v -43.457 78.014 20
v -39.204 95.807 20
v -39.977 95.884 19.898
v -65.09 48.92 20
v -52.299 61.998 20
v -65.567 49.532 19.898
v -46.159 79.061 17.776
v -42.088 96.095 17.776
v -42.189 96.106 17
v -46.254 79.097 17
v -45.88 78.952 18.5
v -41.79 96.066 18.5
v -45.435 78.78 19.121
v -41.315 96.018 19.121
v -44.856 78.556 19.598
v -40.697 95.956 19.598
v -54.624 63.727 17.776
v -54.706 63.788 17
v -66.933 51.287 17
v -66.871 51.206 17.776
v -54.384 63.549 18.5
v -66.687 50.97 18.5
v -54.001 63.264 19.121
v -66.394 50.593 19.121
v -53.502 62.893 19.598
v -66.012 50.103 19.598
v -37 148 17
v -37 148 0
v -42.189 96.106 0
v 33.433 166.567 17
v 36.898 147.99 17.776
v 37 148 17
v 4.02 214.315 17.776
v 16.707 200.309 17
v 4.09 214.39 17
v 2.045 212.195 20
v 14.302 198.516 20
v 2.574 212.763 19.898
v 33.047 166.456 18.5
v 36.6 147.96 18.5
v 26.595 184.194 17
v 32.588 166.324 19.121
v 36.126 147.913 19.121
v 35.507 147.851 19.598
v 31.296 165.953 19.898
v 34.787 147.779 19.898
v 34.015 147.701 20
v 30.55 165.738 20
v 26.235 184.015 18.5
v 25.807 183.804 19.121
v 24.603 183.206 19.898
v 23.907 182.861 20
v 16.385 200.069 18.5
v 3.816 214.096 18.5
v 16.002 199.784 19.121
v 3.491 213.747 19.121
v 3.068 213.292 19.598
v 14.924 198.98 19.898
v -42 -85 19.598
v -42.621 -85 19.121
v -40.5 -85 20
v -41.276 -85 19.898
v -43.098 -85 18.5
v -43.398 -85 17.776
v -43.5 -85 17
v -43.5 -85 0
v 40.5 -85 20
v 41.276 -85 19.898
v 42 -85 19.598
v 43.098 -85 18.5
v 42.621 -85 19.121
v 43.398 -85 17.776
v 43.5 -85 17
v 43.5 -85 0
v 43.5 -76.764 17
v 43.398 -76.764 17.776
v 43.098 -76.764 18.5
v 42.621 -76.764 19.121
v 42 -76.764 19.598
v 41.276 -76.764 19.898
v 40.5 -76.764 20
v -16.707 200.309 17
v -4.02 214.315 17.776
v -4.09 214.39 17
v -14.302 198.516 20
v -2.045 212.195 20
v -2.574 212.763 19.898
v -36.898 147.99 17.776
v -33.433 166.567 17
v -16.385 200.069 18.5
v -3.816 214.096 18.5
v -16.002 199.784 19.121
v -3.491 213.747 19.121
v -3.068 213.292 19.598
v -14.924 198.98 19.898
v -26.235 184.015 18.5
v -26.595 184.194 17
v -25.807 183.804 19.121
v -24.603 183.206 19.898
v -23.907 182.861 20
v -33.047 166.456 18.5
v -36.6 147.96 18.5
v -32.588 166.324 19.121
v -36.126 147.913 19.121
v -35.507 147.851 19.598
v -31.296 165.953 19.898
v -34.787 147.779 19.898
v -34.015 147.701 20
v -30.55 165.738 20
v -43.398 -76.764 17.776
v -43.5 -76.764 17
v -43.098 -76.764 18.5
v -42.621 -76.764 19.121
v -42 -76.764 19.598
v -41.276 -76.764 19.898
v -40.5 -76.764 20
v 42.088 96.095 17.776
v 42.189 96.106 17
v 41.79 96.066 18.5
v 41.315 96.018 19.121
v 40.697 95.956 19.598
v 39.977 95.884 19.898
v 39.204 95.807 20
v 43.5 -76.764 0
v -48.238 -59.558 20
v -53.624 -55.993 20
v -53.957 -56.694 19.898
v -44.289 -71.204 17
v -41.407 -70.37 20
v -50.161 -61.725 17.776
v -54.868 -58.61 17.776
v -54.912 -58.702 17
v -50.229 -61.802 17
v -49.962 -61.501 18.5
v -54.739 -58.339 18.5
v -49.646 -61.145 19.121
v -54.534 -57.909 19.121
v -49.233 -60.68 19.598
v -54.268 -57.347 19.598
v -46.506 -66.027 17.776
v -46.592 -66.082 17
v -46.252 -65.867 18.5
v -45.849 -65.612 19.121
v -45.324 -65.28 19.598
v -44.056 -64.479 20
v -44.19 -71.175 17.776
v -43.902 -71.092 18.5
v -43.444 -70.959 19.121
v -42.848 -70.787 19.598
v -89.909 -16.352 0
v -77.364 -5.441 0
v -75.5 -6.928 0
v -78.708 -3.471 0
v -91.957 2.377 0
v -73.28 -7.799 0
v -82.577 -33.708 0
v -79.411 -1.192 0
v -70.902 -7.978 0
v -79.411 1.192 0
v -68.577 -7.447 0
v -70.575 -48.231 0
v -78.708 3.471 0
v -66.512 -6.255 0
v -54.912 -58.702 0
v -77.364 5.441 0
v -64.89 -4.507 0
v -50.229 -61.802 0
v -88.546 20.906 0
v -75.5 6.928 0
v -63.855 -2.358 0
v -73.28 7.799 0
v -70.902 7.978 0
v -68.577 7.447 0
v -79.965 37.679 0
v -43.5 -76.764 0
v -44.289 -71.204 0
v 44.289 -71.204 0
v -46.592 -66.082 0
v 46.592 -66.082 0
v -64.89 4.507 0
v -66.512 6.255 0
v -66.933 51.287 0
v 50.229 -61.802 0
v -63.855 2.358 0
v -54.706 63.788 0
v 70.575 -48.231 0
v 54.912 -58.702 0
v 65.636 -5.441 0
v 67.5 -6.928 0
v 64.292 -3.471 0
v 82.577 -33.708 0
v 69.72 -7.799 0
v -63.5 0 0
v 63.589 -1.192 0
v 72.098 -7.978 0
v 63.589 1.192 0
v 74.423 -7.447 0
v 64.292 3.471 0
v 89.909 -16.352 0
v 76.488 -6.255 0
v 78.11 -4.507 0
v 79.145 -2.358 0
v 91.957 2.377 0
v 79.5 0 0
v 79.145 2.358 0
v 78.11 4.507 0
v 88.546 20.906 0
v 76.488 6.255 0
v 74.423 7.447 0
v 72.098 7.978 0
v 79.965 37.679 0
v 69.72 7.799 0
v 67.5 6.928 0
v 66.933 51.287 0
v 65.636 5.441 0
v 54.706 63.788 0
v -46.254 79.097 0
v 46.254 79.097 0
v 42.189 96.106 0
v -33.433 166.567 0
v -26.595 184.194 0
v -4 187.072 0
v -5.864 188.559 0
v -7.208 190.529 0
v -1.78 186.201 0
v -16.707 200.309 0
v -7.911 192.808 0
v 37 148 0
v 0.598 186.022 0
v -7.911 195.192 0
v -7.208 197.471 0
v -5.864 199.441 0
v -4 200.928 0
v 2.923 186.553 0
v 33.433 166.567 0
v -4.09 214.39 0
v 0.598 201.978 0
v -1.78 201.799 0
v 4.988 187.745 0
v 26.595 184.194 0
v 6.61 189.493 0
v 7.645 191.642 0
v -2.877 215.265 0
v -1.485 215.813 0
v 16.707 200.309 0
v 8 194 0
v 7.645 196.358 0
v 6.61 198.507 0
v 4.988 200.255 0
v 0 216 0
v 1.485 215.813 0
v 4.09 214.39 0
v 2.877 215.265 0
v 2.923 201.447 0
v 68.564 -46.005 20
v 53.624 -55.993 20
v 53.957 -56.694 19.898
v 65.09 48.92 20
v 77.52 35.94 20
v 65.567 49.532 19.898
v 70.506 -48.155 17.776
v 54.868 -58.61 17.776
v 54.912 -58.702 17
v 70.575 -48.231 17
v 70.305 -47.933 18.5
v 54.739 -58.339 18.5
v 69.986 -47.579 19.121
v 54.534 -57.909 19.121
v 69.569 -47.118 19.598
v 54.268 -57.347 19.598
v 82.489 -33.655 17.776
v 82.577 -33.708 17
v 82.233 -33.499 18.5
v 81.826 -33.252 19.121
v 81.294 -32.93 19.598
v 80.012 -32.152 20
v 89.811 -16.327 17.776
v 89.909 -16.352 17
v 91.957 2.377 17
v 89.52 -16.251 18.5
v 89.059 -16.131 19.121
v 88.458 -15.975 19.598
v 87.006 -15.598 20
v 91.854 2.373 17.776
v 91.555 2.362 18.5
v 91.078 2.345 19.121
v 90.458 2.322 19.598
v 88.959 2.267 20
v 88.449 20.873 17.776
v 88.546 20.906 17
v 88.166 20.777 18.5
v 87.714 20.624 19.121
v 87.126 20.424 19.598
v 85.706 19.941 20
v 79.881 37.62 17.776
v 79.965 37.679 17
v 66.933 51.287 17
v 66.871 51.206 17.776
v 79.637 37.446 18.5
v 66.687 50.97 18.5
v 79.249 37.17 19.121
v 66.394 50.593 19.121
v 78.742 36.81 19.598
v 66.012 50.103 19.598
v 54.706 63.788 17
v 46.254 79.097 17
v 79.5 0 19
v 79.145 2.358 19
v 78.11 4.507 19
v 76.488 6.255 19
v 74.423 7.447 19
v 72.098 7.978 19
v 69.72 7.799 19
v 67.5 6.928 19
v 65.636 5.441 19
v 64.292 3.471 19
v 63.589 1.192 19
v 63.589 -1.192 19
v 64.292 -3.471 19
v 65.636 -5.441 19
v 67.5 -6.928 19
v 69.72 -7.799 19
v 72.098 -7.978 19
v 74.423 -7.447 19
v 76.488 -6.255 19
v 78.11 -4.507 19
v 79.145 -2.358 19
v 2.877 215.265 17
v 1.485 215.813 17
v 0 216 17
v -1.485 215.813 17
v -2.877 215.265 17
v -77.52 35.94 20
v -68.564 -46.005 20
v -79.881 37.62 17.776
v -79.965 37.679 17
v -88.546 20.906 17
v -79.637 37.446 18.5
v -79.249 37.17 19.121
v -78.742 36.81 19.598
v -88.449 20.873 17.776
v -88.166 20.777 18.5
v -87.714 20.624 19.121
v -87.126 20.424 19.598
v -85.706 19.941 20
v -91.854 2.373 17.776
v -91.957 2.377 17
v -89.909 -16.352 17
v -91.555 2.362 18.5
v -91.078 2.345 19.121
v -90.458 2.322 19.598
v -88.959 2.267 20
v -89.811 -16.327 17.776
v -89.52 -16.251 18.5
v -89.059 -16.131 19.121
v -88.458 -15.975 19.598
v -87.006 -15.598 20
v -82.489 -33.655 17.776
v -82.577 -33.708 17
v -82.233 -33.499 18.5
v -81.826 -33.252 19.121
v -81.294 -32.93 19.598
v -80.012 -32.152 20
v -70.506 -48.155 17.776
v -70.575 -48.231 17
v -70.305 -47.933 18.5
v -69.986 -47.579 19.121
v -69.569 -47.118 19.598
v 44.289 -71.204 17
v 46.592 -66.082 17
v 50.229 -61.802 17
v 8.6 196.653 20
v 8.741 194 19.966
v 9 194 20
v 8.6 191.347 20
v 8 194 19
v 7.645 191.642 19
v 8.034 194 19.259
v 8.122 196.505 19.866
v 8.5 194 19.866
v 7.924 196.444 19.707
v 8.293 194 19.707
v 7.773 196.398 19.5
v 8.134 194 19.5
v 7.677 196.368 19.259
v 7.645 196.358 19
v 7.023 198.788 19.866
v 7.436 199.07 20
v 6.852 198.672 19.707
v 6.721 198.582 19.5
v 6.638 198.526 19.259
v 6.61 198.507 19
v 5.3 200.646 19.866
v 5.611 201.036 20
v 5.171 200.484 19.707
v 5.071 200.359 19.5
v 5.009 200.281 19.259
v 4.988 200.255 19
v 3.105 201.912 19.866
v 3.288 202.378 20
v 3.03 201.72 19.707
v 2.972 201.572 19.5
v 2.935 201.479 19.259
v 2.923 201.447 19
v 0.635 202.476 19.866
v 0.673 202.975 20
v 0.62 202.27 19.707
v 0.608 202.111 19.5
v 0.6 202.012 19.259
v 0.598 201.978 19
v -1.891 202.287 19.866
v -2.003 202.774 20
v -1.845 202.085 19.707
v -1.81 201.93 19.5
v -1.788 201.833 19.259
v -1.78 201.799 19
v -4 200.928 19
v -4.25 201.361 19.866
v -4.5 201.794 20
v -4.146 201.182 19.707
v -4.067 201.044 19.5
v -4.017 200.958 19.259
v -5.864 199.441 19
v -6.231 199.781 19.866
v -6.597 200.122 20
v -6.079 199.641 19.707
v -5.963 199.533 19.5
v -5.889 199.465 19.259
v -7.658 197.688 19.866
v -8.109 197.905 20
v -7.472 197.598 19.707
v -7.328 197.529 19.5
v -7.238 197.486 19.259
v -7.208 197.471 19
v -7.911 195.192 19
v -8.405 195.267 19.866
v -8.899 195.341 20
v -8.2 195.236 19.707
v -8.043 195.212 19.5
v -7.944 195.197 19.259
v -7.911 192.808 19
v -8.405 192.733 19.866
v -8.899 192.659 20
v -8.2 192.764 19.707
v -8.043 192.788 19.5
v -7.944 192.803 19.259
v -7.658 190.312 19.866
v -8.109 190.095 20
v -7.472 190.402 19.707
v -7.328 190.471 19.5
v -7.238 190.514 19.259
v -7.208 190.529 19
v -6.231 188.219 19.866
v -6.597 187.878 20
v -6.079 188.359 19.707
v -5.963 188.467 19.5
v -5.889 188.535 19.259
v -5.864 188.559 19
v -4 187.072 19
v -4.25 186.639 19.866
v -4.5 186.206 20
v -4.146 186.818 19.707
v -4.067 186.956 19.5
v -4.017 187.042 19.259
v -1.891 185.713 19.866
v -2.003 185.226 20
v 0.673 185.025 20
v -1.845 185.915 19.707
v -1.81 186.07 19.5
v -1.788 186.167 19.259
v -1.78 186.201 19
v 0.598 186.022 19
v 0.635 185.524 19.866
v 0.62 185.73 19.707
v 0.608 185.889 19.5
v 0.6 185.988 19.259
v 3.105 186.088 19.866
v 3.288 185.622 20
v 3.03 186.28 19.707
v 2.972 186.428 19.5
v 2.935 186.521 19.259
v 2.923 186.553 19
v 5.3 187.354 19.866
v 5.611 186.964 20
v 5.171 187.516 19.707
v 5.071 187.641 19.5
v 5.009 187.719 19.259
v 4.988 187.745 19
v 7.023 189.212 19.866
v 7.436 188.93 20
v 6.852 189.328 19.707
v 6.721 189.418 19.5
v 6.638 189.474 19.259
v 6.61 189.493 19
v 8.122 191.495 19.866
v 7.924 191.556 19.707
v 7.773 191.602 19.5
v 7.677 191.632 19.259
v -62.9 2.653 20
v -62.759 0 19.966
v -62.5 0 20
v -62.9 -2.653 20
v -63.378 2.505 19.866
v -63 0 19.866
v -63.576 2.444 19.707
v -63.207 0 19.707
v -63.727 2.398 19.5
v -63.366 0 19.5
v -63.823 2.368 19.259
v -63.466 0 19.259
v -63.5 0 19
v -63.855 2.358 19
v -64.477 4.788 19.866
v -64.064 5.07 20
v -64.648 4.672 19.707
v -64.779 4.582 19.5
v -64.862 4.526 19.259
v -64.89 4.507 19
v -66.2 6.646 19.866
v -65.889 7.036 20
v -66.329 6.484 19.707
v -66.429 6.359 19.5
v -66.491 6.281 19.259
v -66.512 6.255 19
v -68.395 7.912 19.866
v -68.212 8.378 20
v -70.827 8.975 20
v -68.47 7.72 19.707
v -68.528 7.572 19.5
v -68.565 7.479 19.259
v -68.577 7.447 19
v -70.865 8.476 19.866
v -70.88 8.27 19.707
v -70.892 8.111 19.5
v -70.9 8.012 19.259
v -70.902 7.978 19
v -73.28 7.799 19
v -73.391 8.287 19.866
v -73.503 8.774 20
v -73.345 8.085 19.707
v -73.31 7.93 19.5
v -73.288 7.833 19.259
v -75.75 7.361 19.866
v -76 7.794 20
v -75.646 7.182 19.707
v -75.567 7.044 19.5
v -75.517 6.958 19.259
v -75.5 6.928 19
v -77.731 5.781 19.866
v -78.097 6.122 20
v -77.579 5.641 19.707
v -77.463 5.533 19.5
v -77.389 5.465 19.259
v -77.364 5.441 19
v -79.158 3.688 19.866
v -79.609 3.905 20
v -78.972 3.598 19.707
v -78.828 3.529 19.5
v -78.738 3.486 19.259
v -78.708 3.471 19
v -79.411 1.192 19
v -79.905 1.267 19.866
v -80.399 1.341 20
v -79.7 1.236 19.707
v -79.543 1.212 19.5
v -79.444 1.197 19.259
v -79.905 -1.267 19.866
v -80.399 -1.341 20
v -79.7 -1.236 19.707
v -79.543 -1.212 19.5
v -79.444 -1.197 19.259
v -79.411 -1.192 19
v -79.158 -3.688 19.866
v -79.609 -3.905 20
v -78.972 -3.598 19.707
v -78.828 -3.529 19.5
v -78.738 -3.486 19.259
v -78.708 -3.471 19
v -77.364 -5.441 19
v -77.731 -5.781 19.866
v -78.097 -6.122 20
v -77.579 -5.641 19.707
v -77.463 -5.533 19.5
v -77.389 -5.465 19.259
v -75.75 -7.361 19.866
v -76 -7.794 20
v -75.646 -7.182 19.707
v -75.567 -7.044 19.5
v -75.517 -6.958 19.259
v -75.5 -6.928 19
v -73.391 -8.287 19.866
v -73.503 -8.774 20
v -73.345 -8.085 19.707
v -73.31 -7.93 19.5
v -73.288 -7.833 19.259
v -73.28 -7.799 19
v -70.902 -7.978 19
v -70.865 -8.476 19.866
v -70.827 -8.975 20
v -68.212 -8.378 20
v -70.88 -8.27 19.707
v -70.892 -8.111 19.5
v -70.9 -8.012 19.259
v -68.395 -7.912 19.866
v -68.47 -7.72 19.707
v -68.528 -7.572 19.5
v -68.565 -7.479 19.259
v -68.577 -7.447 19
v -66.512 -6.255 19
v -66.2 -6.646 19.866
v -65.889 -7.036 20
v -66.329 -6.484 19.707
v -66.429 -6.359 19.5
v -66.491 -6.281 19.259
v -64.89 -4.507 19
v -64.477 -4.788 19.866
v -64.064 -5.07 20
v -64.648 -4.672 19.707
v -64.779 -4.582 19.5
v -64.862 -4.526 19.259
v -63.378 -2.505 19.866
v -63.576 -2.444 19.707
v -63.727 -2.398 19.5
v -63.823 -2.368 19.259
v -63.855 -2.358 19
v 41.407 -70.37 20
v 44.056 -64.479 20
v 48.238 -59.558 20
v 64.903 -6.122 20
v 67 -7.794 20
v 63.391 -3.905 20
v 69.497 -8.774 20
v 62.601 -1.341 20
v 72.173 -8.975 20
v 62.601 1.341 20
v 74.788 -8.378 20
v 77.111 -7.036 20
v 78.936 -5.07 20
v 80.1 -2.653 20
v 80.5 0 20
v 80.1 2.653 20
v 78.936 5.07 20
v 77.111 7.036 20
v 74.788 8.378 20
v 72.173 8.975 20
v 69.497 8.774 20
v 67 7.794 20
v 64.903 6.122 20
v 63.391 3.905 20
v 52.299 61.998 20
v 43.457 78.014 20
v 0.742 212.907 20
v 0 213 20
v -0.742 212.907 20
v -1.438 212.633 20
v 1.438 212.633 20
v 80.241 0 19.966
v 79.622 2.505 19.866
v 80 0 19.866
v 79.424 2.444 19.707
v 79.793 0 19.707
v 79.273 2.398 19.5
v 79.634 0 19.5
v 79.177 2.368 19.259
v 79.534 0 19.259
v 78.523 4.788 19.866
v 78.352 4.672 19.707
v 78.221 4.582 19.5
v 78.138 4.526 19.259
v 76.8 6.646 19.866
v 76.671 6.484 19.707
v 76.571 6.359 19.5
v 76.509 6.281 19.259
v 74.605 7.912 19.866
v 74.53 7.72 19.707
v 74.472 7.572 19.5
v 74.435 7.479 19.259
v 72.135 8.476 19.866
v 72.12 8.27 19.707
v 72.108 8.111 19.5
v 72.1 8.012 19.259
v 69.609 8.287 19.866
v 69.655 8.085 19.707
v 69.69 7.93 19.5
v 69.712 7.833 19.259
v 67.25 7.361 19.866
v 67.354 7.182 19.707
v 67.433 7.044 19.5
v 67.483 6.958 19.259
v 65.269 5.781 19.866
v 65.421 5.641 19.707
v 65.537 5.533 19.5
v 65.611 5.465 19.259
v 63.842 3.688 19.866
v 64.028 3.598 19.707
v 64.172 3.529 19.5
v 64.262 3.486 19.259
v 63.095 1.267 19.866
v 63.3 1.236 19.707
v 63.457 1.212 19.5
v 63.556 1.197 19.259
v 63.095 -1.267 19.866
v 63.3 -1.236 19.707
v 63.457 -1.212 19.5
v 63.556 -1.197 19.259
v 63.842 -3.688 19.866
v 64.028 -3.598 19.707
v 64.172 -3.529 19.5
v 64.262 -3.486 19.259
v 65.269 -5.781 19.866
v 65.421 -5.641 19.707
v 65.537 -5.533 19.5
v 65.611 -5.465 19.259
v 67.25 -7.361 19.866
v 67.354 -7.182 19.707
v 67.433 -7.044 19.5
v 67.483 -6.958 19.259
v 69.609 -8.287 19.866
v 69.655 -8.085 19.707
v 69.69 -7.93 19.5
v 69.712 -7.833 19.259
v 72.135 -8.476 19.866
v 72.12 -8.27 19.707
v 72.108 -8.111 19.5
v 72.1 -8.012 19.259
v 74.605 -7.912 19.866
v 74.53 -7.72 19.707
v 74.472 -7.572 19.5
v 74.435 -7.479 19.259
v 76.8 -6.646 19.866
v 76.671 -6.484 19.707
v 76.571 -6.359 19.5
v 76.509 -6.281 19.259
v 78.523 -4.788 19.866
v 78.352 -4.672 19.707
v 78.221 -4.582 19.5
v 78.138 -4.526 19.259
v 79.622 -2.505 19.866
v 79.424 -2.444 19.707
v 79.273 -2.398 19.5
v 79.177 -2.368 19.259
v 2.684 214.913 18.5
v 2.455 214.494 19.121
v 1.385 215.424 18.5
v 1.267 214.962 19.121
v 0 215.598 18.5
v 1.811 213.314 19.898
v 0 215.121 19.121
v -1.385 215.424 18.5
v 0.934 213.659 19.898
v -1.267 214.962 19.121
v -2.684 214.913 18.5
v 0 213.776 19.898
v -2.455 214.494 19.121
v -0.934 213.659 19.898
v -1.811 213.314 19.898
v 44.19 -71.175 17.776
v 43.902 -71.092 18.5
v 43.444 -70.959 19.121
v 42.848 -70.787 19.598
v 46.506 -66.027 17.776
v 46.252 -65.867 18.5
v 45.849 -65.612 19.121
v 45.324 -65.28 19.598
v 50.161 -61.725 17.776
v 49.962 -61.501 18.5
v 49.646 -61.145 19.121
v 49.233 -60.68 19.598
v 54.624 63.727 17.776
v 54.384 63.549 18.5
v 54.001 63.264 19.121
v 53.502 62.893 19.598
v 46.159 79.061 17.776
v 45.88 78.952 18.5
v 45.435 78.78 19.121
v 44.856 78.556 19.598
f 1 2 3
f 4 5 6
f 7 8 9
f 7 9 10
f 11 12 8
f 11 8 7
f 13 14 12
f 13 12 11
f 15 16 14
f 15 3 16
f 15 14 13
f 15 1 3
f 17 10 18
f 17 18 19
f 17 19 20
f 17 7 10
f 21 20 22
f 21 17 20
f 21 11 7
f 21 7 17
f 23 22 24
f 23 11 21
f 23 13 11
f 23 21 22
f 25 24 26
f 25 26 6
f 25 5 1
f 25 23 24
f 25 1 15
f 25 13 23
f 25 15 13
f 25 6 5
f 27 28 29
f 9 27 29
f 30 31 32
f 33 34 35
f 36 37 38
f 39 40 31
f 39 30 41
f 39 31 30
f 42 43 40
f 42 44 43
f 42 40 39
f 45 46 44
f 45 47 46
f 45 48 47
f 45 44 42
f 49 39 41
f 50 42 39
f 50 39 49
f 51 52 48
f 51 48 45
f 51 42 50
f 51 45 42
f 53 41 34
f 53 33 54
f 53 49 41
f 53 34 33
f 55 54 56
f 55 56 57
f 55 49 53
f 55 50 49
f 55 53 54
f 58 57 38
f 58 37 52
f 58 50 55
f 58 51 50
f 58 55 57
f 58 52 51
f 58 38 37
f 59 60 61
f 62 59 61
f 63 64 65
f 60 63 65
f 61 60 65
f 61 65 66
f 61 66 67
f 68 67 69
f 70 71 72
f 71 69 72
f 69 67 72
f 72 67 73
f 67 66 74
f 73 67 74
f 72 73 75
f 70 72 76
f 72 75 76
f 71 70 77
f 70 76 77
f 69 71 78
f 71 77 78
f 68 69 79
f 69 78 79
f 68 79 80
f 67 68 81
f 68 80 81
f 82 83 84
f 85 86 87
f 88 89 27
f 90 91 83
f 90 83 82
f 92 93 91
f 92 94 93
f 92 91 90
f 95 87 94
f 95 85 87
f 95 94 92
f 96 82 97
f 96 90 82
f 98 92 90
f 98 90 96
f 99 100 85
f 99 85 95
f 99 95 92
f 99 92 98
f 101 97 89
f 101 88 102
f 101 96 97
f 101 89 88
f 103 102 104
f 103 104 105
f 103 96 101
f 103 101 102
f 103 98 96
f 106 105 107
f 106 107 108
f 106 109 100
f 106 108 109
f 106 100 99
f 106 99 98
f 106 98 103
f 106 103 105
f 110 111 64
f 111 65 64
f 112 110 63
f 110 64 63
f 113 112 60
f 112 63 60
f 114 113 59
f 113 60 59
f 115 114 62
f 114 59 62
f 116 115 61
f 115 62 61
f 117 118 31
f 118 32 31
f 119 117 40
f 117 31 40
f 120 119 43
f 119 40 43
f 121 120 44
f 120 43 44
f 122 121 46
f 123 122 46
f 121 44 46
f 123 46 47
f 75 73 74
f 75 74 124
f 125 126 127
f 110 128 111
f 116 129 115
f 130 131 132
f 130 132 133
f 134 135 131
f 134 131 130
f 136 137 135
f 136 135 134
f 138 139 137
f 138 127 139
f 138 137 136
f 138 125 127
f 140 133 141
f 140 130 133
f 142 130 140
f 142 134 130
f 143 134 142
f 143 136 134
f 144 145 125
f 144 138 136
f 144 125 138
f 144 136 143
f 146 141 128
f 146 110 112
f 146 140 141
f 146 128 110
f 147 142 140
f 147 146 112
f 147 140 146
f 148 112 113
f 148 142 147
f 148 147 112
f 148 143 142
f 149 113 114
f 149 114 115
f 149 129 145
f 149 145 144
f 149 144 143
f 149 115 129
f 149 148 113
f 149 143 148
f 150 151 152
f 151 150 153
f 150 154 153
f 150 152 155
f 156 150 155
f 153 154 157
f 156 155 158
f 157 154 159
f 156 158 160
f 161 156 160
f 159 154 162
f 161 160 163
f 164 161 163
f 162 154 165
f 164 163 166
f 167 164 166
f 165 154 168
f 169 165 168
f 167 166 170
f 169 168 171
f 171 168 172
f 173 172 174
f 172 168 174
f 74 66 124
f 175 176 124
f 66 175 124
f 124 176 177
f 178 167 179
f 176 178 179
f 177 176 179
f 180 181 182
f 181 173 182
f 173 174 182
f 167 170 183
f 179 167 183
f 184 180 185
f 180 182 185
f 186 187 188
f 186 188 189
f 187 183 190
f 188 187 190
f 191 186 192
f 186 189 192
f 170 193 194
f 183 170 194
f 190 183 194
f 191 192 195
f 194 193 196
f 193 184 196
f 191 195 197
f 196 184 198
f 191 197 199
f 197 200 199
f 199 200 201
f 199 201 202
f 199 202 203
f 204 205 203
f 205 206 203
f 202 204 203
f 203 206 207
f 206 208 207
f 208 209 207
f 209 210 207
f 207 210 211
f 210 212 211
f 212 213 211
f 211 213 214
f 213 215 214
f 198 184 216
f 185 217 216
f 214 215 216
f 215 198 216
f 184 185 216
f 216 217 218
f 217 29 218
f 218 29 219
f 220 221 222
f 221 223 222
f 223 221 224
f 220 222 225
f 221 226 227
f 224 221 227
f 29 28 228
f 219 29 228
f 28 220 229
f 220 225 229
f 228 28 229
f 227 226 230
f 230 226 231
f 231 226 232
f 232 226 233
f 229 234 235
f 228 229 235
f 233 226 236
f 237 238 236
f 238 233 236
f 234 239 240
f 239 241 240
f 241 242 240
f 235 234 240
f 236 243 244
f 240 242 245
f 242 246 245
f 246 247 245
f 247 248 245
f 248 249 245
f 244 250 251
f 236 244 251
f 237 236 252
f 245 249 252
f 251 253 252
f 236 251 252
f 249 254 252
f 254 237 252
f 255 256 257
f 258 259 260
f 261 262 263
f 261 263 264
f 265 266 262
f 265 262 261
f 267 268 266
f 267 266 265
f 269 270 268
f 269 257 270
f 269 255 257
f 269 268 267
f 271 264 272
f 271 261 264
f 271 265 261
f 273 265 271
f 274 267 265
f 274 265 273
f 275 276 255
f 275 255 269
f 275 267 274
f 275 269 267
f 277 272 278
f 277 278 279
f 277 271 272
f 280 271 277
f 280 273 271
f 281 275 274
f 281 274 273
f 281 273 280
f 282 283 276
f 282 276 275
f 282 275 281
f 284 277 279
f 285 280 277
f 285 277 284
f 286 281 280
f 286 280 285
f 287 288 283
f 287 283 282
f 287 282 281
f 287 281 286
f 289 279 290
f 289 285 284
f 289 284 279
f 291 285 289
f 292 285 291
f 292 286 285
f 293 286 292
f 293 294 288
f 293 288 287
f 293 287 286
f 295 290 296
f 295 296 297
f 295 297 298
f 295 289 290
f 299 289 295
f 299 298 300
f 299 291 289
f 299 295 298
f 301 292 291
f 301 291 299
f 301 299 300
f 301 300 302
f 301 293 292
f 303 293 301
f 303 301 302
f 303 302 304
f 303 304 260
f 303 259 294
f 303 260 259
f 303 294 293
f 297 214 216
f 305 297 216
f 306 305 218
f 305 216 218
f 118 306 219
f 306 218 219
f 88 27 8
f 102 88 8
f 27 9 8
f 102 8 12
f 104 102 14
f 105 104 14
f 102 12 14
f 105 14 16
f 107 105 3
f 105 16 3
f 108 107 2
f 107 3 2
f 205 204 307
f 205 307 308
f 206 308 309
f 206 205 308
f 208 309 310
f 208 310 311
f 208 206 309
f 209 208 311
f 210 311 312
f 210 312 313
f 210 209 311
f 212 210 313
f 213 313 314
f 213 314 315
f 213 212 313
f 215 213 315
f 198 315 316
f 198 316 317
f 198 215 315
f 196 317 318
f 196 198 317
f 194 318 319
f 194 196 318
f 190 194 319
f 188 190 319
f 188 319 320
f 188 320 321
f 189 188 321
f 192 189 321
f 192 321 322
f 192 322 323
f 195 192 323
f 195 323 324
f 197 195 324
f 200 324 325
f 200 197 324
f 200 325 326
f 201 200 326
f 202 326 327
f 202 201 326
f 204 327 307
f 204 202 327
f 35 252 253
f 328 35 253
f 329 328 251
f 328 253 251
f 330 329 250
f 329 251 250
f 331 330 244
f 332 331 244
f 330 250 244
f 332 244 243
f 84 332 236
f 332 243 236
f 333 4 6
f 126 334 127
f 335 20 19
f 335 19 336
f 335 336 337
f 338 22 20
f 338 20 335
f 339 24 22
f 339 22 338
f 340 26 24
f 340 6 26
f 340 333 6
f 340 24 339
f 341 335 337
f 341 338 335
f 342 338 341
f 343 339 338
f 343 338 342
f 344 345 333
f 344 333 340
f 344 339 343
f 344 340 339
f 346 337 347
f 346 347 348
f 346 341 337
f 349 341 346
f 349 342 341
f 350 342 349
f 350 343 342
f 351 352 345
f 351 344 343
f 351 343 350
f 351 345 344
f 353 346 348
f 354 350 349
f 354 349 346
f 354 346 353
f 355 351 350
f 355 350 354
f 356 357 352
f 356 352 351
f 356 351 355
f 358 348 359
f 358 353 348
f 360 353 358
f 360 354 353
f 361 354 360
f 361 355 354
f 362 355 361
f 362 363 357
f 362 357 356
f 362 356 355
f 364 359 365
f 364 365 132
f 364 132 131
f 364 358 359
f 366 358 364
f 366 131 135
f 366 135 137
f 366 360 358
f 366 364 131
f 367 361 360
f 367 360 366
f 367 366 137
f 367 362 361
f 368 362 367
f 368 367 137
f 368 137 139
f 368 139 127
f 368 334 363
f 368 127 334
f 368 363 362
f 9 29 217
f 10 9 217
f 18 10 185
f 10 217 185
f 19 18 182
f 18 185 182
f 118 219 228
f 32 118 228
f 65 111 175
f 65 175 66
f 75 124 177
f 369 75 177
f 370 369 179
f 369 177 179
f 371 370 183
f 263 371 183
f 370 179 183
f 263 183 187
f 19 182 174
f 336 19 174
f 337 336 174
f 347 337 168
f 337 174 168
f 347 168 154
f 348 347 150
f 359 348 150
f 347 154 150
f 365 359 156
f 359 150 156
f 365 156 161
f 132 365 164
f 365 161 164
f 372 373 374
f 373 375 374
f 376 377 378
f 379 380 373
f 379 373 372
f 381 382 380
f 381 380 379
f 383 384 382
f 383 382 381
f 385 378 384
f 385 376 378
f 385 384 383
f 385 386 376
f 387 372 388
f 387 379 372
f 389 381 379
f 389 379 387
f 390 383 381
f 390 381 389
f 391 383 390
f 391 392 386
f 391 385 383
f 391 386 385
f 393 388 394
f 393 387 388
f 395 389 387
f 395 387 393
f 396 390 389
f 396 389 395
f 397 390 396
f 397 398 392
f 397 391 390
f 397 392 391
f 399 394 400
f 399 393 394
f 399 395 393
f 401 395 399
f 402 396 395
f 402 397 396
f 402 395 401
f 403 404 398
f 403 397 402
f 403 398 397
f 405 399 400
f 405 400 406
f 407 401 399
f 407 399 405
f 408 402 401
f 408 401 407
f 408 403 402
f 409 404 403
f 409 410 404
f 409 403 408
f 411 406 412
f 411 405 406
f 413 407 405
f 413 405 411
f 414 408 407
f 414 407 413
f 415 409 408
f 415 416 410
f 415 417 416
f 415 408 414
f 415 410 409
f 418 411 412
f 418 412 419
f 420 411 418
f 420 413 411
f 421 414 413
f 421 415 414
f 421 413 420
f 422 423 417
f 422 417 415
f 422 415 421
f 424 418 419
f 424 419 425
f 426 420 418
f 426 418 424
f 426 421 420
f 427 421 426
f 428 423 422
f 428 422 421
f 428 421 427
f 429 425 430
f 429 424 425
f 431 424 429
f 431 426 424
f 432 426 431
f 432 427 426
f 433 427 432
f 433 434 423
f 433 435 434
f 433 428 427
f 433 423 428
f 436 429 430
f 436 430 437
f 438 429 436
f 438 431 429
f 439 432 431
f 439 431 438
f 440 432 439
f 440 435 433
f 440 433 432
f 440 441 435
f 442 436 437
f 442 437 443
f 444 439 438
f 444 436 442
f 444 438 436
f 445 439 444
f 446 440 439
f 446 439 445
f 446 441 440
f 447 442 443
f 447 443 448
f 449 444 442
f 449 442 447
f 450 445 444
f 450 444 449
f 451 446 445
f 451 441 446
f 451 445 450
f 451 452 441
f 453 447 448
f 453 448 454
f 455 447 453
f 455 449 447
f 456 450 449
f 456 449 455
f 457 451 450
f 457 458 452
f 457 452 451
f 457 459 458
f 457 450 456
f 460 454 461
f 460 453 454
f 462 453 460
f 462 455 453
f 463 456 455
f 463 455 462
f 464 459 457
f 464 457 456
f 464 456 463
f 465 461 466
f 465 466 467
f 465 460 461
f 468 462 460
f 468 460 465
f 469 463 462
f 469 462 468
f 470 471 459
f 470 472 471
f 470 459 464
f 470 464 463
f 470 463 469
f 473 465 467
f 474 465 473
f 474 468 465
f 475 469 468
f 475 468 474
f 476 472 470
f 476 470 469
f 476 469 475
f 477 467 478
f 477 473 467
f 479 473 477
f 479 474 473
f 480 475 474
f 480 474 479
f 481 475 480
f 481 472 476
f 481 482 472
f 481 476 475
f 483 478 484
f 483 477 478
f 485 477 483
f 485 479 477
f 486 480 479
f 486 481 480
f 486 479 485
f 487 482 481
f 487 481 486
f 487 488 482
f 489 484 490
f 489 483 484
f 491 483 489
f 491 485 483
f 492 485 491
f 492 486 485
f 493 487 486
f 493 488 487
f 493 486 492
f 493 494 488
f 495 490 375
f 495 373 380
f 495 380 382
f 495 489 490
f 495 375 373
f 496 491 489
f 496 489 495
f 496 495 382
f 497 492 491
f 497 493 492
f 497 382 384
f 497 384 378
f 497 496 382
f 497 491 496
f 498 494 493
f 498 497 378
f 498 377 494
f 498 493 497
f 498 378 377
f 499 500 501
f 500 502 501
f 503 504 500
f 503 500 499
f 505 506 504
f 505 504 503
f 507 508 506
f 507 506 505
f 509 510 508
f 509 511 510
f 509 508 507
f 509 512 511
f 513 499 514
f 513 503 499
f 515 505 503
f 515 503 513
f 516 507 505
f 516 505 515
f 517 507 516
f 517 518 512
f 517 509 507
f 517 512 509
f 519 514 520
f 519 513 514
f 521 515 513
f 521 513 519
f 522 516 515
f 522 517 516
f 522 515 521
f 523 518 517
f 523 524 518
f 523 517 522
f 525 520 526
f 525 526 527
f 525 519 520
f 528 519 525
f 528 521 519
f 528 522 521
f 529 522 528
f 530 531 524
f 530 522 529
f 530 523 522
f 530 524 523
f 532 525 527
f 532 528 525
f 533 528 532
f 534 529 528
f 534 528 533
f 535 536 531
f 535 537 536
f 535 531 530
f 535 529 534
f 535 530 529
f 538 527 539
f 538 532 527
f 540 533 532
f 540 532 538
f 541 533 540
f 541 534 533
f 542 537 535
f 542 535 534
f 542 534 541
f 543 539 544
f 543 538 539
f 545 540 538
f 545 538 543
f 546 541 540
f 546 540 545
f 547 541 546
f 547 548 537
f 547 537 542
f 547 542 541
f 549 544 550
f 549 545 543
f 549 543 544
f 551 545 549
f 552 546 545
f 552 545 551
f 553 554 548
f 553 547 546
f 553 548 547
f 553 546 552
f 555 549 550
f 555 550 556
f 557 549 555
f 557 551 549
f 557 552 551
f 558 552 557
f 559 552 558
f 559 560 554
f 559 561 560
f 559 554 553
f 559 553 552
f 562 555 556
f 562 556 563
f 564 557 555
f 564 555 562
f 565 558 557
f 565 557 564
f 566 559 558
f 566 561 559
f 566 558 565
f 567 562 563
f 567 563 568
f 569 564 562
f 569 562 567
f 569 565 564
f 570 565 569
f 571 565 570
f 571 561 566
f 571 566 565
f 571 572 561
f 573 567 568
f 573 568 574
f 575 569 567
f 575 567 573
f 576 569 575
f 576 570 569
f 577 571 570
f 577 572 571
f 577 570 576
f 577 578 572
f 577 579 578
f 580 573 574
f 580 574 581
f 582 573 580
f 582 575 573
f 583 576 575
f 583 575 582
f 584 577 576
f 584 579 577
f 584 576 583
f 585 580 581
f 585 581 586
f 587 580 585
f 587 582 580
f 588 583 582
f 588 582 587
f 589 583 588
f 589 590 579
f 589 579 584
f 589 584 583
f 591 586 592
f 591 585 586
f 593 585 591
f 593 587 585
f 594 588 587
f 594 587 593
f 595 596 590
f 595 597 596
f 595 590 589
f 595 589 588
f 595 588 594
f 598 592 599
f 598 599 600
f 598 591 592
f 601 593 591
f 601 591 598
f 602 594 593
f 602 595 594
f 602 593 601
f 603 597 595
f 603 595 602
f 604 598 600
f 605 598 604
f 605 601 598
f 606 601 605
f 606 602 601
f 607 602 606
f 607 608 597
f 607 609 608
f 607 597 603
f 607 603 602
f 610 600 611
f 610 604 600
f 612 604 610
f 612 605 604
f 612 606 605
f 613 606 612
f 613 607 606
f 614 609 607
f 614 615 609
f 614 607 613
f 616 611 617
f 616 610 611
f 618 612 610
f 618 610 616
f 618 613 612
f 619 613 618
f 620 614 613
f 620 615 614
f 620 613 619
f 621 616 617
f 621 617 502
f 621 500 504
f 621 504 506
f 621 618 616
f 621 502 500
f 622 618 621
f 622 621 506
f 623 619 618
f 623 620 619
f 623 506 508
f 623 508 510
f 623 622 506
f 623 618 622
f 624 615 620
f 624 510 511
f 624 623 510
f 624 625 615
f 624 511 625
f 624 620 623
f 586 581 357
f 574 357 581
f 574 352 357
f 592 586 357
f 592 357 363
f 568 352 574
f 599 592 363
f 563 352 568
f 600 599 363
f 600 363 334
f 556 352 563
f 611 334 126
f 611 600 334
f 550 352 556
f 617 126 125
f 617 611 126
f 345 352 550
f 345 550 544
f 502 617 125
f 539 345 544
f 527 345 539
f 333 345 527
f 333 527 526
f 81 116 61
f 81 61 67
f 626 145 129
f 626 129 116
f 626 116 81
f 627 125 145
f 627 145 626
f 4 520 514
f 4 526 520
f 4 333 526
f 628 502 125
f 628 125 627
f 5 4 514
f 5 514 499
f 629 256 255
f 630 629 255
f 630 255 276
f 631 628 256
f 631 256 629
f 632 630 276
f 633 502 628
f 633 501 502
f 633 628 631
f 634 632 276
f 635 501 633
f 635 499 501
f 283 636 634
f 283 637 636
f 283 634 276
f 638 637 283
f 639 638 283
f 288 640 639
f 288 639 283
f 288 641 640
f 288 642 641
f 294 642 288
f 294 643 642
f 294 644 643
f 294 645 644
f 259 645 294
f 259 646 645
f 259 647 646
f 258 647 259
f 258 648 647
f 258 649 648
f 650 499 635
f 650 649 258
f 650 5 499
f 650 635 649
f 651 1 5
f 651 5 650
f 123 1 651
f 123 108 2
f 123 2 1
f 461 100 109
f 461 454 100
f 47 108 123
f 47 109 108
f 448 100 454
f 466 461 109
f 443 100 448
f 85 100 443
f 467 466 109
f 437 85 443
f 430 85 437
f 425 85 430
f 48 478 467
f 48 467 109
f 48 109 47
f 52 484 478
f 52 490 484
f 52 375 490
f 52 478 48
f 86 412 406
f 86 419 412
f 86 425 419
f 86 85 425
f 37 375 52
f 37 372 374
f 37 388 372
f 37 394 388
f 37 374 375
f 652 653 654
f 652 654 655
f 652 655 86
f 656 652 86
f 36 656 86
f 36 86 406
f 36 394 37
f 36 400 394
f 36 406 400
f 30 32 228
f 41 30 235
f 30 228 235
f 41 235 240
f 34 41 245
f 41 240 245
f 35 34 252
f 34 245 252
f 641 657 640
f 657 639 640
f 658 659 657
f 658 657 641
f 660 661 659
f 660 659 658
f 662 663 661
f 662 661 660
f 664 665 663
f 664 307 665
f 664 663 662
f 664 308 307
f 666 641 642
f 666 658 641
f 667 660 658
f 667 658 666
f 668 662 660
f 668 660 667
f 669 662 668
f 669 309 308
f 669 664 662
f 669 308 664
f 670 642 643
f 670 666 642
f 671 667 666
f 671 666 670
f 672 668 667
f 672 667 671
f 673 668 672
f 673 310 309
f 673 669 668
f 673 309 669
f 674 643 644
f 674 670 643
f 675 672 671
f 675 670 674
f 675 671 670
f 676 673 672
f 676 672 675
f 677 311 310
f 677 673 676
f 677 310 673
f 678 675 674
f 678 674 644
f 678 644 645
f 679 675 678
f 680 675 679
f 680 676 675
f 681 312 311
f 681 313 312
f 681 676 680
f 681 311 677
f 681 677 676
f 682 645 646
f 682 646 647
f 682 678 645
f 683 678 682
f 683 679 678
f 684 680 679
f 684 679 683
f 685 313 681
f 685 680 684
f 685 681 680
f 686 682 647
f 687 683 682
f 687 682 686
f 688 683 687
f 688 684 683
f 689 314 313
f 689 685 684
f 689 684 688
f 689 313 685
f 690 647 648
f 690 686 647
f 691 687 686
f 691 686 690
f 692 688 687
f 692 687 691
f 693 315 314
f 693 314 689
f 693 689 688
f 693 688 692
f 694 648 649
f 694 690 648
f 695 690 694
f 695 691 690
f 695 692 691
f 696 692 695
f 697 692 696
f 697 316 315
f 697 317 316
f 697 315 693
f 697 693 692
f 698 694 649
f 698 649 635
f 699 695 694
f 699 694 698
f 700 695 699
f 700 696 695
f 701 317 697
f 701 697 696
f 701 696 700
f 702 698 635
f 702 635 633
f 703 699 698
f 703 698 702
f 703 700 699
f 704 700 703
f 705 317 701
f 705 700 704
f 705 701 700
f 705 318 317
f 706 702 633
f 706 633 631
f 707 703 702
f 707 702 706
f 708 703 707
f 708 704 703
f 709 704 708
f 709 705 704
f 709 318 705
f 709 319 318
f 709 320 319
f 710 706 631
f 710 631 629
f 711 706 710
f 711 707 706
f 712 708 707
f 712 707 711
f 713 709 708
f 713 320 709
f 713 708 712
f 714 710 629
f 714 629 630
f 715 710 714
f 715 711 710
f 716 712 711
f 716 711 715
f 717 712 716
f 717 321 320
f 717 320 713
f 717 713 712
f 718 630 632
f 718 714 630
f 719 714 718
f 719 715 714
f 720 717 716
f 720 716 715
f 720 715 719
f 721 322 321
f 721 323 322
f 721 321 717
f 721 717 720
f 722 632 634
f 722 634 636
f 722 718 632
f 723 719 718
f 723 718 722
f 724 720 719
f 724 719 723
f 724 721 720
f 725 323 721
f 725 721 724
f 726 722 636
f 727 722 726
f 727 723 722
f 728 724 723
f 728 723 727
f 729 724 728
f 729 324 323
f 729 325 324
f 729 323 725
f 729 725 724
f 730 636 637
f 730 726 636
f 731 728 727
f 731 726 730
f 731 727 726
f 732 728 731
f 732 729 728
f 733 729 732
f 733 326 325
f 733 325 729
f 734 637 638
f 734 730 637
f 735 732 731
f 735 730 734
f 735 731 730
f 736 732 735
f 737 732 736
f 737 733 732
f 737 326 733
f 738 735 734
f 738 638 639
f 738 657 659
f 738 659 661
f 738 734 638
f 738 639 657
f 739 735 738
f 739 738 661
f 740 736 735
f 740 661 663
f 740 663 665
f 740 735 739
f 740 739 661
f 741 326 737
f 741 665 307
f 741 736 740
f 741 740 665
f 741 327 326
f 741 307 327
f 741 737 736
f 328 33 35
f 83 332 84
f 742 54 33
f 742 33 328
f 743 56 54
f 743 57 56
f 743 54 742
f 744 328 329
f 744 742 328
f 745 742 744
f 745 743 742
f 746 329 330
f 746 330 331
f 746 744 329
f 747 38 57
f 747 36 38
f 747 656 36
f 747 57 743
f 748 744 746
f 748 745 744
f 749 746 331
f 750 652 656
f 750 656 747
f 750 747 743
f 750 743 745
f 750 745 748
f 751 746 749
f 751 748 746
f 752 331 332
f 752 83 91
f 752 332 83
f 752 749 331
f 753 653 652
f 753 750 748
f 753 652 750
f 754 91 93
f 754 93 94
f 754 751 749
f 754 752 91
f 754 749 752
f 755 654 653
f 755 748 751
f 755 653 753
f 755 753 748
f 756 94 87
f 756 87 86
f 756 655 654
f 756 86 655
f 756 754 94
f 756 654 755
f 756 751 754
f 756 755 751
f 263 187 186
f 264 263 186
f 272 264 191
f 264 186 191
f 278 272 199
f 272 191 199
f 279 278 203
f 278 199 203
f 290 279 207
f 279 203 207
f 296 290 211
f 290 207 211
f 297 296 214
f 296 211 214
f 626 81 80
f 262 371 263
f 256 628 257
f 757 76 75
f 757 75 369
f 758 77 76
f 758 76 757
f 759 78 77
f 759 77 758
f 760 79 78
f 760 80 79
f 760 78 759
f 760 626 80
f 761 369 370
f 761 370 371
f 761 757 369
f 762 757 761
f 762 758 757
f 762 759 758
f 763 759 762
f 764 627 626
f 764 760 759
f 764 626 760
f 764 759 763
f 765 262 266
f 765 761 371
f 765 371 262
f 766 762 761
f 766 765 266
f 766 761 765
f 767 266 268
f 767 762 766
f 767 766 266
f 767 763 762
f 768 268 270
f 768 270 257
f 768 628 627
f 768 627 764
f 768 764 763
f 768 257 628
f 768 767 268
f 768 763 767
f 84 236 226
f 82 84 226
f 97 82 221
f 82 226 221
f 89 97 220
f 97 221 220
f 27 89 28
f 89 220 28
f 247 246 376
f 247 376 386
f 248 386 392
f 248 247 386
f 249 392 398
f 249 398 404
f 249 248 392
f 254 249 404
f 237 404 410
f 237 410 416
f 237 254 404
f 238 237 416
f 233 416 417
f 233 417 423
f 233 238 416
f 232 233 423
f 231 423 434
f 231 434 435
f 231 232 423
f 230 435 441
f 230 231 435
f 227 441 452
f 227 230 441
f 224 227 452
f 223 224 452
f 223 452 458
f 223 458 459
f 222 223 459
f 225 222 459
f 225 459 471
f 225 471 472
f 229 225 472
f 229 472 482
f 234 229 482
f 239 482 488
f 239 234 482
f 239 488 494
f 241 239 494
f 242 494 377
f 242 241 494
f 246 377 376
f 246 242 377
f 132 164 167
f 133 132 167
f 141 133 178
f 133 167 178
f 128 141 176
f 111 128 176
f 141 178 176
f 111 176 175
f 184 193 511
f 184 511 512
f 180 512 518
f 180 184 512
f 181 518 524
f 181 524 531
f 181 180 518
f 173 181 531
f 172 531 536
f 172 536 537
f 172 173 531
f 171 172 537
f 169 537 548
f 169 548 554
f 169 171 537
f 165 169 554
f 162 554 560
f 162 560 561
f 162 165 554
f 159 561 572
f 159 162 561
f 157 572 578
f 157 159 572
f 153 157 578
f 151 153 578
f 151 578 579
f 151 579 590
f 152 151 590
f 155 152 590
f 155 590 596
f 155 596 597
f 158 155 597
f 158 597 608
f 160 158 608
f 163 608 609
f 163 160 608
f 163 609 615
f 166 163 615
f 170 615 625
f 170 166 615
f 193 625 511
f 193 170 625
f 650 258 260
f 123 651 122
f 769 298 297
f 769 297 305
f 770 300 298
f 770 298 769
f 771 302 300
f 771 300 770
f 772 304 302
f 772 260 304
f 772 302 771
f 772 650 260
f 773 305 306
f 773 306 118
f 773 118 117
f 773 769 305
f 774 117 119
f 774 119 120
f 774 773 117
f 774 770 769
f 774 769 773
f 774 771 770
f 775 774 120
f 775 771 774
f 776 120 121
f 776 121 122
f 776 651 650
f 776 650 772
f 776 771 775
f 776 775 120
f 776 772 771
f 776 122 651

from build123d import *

# Parameters (mm, degrees)
F0_R     = 8
F1_DEPTH = 20
F2_R     = 3
F3_R     = 1


with BuildPart() as f1:
    # F0 (on Top) → F1 (new body)
    with BuildSketch(Plane.XY):
        with BuildLine():
            Line((-43.5, -85), (0, -85))
            Line((0, -85), (43.5, -85))
            Line((43.5, -85), (43.5, -76.764249))
            ThreePointArc((43.5, -76.764249), (46.591944, -66.081663), (54.911765, -58.702073))
            ThreePointArc((54.911765, -58.702073), (91.61519, -7.06238), (66.93343, 51.286657))
            ThreePointArc((66.93343, 51.286657), (49.963072, 71.157412), (42.189443, 96.105572))
            Line((42.189443, 96.105572), (37, 148))
            ThreePointArc((37, 148), (26.594735, 184.193845), (4.090054, 214.389927))
            ThreePointArc((4.090054, 214.389927), (0, 216), (-4.090054, 214.389927))
            ThreePointArc((-4.090054, 214.389927), (-26.594735, 184.193845), (-37, 148))
            Line((-37, 148), (-42.189443, 96.105572))
            ThreePointArc((-42.189443, 96.105572), (-49.963072, 71.157412), (-66.93343, 51.286657))
            ThreePointArc((-66.93343, 51.286657), (-91.61519, -7.06238), (-54.911765, -58.702073))
            ThreePointArc((-54.911765, -58.702073), (-46.591944, -66.081663), (-43.5, -76.764249))
            Line((-43.5, -76.764249), (-43.5, -85))
        make_face()
        with Locations((-71.5, 0)):
            Circle(F0_R, mode=Mode.SUBTRACT)
        with Locations((71.5, 0)):
            Circle(F0_R, mode=Mode.SUBTRACT)
        with Locations((0, 194)):
            Circle(F0_R, mode=Mode.SUBTRACT)
    extrude(amount=F1_DEPTH)

    # F2
    f2_edges = [f1.edges().sort_by_distance(p)[0] for p in [
        (39.594721, 122.052786, 20),
    ]]
    fillet(f2_edges, radius=F2_R)

    # F3
    f3_edges = [f1.edges().sort_by_distance(p)[0] for p in [
        (-8, 194, 20),
        (-79.5, 0, 20),
        (63.5, 0, 20),
    ]]
    fillet(f3_edges, radius=F3_R)


solid = f1.part
